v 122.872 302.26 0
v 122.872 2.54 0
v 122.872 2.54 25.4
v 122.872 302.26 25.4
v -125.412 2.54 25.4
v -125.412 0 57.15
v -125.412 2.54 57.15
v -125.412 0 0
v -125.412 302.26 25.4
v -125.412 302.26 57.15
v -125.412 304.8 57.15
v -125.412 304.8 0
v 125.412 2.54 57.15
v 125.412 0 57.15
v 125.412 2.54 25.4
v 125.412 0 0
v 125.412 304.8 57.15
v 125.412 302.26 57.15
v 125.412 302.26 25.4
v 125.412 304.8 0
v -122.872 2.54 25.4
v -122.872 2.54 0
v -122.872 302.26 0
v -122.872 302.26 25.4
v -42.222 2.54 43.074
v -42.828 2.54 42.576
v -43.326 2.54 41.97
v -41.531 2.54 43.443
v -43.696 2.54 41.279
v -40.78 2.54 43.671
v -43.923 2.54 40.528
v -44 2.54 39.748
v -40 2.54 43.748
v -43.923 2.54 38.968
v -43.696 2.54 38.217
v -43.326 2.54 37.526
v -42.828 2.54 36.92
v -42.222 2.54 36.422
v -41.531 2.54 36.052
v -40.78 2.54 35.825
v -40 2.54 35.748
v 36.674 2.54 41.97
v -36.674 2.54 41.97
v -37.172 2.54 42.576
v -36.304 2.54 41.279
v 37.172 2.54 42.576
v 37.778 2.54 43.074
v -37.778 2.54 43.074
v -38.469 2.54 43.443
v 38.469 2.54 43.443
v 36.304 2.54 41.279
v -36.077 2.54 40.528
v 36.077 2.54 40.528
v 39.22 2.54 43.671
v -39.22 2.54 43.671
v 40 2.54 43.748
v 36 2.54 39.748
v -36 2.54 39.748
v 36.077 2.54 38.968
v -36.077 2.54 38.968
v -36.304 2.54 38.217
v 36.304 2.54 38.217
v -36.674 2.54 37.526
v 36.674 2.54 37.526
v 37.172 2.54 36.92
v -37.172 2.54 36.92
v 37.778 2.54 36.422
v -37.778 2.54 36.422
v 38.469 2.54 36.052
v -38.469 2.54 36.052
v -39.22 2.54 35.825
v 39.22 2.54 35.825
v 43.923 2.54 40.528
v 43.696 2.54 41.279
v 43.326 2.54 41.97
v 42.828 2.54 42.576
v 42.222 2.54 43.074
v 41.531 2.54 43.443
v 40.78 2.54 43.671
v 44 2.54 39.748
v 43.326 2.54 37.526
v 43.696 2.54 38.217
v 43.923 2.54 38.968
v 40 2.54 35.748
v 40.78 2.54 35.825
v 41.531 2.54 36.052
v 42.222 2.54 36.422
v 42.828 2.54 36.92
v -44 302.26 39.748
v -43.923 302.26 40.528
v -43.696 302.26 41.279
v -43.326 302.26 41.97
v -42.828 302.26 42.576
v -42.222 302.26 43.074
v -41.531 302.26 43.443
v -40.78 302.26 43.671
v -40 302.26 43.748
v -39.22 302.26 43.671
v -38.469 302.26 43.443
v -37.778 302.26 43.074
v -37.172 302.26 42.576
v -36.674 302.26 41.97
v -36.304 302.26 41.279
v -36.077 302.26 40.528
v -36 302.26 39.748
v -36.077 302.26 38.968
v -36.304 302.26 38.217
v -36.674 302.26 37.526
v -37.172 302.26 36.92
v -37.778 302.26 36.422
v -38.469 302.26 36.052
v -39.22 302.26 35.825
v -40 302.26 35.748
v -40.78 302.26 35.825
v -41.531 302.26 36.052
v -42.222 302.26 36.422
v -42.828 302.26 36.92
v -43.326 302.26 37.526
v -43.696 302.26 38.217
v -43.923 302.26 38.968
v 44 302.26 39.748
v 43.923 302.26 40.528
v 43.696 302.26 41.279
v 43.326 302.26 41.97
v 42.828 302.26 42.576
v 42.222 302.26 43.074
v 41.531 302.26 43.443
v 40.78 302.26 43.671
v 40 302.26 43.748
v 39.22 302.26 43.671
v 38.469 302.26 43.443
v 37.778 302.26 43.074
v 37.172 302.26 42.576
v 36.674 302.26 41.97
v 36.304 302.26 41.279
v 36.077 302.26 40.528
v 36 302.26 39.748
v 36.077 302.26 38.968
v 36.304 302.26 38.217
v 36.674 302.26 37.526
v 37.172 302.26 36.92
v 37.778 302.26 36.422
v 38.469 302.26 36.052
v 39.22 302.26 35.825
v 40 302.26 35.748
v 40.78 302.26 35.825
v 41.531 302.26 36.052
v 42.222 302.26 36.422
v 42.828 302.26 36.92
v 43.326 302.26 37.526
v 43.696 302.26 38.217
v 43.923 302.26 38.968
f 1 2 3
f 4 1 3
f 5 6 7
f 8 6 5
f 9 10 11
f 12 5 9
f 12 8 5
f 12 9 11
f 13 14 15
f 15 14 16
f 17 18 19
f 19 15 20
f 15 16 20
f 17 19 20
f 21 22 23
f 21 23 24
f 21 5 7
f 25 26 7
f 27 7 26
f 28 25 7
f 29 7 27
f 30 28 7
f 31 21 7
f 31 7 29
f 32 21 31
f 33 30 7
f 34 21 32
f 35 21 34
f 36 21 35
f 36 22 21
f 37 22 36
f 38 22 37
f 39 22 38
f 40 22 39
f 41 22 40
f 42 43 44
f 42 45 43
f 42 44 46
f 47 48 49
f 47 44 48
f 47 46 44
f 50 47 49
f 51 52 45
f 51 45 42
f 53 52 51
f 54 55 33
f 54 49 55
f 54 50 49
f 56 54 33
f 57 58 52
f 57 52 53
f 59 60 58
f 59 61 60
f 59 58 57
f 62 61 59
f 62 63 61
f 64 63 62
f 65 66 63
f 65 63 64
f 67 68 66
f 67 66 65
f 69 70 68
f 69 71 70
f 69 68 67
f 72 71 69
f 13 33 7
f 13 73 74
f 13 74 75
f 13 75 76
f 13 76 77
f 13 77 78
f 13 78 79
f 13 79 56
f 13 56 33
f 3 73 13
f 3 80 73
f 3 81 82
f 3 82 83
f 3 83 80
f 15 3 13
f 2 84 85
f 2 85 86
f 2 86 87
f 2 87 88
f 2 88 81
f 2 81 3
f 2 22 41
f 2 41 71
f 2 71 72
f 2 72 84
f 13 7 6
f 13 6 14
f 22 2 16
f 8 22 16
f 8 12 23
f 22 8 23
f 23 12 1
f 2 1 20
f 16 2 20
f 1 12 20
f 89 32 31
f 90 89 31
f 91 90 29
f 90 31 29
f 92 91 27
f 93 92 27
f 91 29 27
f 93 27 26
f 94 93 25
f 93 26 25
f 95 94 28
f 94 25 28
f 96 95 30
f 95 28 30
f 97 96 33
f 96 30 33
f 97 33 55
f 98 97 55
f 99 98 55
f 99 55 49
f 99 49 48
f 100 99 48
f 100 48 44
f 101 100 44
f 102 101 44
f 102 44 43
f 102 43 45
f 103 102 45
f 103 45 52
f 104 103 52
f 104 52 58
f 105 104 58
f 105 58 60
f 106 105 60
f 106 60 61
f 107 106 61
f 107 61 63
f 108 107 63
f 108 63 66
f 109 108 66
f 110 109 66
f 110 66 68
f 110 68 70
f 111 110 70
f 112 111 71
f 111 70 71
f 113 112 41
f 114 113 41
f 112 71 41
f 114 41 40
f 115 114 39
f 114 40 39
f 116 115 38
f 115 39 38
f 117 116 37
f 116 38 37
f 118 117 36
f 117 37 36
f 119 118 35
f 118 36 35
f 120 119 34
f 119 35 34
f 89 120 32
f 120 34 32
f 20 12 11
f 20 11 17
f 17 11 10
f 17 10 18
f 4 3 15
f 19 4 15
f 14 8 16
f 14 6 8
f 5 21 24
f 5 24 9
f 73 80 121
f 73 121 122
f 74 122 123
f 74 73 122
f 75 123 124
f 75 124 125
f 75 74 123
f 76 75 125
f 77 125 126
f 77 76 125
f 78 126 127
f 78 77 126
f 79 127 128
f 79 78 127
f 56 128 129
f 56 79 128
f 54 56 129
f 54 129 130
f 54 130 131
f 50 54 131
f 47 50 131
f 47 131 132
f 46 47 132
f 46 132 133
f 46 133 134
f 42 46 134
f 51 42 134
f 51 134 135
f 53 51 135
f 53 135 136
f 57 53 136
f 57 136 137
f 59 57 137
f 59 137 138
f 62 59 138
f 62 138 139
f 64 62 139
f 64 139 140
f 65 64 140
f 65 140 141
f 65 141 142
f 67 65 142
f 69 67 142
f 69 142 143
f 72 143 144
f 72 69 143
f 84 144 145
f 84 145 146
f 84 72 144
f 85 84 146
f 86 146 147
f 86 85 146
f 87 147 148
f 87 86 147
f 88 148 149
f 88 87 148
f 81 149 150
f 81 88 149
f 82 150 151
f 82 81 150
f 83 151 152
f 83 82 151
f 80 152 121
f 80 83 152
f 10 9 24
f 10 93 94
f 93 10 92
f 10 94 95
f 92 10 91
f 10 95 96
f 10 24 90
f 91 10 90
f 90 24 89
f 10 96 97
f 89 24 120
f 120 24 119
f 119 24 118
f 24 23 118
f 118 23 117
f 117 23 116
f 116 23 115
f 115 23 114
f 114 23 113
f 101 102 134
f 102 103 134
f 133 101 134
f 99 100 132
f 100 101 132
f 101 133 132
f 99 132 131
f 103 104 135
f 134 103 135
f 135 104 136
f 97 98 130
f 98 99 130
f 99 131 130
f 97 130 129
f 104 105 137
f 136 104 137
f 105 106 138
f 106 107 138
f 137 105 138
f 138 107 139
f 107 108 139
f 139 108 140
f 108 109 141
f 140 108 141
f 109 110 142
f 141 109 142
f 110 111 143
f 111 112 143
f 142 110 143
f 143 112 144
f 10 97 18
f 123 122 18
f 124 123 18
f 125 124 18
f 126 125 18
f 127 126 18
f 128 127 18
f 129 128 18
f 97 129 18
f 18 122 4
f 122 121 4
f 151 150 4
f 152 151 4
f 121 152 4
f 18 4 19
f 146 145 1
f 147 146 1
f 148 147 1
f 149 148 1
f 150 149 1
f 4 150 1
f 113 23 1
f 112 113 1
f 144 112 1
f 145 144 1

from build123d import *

# Parameters (mm, degrees)
F1_W     = 250.825
F1_H     = 2.54
F2_DEPTH = 57.15
F3_W     = 2.54
F3_H     = 25.4
F4_DEPTH = 302.26
F6_R     = 4
F7_DEPTH = 302.26


with BuildPart() as f2:
    # F1 (on Top) → F2 (new body)
    with BuildSketch(Plane.XY):
        with Locations((0, 1.27)):
            Rectangle(F1_W, F1_H)
        with Locations((0, 303.53)):
            Rectangle(F1_W, F1_H)
    extrude(amount=F2_DEPTH)

    # F6 (on Front) → F7 (join, through all)
    with BuildSketch(Plane.XZ):
        with Locations((40, 39.747968)):
            Circle(F6_R)
    extrude(amount=-F7_DEPTH)



with BuildPart() as f4:
    # F3 (on Front) → F4 (new body, through all)
    with BuildSketch(Plane.XZ):
        with Locations((124.1425, 12.7)):
            Rectangle(F3_W, F3_H)
    extrude(amount=-F4_DEPTH)


with BuildPart() as f5_1:
    # F5: instance of F4
    add(f4.part.mirror(Plane.YZ))


with BuildPart() as f2_1:
    add(f2.part)

    add(f4.part)  # F8 merges F4

    add(f5_1.part)  # F8 merges F5_1
    # F8: F2 across plane


with BuildPart() as f2_2:
    add(f2_1.part)
    add(f2_1.part.mirror(Plane.YZ))


solid = f2_2.part
